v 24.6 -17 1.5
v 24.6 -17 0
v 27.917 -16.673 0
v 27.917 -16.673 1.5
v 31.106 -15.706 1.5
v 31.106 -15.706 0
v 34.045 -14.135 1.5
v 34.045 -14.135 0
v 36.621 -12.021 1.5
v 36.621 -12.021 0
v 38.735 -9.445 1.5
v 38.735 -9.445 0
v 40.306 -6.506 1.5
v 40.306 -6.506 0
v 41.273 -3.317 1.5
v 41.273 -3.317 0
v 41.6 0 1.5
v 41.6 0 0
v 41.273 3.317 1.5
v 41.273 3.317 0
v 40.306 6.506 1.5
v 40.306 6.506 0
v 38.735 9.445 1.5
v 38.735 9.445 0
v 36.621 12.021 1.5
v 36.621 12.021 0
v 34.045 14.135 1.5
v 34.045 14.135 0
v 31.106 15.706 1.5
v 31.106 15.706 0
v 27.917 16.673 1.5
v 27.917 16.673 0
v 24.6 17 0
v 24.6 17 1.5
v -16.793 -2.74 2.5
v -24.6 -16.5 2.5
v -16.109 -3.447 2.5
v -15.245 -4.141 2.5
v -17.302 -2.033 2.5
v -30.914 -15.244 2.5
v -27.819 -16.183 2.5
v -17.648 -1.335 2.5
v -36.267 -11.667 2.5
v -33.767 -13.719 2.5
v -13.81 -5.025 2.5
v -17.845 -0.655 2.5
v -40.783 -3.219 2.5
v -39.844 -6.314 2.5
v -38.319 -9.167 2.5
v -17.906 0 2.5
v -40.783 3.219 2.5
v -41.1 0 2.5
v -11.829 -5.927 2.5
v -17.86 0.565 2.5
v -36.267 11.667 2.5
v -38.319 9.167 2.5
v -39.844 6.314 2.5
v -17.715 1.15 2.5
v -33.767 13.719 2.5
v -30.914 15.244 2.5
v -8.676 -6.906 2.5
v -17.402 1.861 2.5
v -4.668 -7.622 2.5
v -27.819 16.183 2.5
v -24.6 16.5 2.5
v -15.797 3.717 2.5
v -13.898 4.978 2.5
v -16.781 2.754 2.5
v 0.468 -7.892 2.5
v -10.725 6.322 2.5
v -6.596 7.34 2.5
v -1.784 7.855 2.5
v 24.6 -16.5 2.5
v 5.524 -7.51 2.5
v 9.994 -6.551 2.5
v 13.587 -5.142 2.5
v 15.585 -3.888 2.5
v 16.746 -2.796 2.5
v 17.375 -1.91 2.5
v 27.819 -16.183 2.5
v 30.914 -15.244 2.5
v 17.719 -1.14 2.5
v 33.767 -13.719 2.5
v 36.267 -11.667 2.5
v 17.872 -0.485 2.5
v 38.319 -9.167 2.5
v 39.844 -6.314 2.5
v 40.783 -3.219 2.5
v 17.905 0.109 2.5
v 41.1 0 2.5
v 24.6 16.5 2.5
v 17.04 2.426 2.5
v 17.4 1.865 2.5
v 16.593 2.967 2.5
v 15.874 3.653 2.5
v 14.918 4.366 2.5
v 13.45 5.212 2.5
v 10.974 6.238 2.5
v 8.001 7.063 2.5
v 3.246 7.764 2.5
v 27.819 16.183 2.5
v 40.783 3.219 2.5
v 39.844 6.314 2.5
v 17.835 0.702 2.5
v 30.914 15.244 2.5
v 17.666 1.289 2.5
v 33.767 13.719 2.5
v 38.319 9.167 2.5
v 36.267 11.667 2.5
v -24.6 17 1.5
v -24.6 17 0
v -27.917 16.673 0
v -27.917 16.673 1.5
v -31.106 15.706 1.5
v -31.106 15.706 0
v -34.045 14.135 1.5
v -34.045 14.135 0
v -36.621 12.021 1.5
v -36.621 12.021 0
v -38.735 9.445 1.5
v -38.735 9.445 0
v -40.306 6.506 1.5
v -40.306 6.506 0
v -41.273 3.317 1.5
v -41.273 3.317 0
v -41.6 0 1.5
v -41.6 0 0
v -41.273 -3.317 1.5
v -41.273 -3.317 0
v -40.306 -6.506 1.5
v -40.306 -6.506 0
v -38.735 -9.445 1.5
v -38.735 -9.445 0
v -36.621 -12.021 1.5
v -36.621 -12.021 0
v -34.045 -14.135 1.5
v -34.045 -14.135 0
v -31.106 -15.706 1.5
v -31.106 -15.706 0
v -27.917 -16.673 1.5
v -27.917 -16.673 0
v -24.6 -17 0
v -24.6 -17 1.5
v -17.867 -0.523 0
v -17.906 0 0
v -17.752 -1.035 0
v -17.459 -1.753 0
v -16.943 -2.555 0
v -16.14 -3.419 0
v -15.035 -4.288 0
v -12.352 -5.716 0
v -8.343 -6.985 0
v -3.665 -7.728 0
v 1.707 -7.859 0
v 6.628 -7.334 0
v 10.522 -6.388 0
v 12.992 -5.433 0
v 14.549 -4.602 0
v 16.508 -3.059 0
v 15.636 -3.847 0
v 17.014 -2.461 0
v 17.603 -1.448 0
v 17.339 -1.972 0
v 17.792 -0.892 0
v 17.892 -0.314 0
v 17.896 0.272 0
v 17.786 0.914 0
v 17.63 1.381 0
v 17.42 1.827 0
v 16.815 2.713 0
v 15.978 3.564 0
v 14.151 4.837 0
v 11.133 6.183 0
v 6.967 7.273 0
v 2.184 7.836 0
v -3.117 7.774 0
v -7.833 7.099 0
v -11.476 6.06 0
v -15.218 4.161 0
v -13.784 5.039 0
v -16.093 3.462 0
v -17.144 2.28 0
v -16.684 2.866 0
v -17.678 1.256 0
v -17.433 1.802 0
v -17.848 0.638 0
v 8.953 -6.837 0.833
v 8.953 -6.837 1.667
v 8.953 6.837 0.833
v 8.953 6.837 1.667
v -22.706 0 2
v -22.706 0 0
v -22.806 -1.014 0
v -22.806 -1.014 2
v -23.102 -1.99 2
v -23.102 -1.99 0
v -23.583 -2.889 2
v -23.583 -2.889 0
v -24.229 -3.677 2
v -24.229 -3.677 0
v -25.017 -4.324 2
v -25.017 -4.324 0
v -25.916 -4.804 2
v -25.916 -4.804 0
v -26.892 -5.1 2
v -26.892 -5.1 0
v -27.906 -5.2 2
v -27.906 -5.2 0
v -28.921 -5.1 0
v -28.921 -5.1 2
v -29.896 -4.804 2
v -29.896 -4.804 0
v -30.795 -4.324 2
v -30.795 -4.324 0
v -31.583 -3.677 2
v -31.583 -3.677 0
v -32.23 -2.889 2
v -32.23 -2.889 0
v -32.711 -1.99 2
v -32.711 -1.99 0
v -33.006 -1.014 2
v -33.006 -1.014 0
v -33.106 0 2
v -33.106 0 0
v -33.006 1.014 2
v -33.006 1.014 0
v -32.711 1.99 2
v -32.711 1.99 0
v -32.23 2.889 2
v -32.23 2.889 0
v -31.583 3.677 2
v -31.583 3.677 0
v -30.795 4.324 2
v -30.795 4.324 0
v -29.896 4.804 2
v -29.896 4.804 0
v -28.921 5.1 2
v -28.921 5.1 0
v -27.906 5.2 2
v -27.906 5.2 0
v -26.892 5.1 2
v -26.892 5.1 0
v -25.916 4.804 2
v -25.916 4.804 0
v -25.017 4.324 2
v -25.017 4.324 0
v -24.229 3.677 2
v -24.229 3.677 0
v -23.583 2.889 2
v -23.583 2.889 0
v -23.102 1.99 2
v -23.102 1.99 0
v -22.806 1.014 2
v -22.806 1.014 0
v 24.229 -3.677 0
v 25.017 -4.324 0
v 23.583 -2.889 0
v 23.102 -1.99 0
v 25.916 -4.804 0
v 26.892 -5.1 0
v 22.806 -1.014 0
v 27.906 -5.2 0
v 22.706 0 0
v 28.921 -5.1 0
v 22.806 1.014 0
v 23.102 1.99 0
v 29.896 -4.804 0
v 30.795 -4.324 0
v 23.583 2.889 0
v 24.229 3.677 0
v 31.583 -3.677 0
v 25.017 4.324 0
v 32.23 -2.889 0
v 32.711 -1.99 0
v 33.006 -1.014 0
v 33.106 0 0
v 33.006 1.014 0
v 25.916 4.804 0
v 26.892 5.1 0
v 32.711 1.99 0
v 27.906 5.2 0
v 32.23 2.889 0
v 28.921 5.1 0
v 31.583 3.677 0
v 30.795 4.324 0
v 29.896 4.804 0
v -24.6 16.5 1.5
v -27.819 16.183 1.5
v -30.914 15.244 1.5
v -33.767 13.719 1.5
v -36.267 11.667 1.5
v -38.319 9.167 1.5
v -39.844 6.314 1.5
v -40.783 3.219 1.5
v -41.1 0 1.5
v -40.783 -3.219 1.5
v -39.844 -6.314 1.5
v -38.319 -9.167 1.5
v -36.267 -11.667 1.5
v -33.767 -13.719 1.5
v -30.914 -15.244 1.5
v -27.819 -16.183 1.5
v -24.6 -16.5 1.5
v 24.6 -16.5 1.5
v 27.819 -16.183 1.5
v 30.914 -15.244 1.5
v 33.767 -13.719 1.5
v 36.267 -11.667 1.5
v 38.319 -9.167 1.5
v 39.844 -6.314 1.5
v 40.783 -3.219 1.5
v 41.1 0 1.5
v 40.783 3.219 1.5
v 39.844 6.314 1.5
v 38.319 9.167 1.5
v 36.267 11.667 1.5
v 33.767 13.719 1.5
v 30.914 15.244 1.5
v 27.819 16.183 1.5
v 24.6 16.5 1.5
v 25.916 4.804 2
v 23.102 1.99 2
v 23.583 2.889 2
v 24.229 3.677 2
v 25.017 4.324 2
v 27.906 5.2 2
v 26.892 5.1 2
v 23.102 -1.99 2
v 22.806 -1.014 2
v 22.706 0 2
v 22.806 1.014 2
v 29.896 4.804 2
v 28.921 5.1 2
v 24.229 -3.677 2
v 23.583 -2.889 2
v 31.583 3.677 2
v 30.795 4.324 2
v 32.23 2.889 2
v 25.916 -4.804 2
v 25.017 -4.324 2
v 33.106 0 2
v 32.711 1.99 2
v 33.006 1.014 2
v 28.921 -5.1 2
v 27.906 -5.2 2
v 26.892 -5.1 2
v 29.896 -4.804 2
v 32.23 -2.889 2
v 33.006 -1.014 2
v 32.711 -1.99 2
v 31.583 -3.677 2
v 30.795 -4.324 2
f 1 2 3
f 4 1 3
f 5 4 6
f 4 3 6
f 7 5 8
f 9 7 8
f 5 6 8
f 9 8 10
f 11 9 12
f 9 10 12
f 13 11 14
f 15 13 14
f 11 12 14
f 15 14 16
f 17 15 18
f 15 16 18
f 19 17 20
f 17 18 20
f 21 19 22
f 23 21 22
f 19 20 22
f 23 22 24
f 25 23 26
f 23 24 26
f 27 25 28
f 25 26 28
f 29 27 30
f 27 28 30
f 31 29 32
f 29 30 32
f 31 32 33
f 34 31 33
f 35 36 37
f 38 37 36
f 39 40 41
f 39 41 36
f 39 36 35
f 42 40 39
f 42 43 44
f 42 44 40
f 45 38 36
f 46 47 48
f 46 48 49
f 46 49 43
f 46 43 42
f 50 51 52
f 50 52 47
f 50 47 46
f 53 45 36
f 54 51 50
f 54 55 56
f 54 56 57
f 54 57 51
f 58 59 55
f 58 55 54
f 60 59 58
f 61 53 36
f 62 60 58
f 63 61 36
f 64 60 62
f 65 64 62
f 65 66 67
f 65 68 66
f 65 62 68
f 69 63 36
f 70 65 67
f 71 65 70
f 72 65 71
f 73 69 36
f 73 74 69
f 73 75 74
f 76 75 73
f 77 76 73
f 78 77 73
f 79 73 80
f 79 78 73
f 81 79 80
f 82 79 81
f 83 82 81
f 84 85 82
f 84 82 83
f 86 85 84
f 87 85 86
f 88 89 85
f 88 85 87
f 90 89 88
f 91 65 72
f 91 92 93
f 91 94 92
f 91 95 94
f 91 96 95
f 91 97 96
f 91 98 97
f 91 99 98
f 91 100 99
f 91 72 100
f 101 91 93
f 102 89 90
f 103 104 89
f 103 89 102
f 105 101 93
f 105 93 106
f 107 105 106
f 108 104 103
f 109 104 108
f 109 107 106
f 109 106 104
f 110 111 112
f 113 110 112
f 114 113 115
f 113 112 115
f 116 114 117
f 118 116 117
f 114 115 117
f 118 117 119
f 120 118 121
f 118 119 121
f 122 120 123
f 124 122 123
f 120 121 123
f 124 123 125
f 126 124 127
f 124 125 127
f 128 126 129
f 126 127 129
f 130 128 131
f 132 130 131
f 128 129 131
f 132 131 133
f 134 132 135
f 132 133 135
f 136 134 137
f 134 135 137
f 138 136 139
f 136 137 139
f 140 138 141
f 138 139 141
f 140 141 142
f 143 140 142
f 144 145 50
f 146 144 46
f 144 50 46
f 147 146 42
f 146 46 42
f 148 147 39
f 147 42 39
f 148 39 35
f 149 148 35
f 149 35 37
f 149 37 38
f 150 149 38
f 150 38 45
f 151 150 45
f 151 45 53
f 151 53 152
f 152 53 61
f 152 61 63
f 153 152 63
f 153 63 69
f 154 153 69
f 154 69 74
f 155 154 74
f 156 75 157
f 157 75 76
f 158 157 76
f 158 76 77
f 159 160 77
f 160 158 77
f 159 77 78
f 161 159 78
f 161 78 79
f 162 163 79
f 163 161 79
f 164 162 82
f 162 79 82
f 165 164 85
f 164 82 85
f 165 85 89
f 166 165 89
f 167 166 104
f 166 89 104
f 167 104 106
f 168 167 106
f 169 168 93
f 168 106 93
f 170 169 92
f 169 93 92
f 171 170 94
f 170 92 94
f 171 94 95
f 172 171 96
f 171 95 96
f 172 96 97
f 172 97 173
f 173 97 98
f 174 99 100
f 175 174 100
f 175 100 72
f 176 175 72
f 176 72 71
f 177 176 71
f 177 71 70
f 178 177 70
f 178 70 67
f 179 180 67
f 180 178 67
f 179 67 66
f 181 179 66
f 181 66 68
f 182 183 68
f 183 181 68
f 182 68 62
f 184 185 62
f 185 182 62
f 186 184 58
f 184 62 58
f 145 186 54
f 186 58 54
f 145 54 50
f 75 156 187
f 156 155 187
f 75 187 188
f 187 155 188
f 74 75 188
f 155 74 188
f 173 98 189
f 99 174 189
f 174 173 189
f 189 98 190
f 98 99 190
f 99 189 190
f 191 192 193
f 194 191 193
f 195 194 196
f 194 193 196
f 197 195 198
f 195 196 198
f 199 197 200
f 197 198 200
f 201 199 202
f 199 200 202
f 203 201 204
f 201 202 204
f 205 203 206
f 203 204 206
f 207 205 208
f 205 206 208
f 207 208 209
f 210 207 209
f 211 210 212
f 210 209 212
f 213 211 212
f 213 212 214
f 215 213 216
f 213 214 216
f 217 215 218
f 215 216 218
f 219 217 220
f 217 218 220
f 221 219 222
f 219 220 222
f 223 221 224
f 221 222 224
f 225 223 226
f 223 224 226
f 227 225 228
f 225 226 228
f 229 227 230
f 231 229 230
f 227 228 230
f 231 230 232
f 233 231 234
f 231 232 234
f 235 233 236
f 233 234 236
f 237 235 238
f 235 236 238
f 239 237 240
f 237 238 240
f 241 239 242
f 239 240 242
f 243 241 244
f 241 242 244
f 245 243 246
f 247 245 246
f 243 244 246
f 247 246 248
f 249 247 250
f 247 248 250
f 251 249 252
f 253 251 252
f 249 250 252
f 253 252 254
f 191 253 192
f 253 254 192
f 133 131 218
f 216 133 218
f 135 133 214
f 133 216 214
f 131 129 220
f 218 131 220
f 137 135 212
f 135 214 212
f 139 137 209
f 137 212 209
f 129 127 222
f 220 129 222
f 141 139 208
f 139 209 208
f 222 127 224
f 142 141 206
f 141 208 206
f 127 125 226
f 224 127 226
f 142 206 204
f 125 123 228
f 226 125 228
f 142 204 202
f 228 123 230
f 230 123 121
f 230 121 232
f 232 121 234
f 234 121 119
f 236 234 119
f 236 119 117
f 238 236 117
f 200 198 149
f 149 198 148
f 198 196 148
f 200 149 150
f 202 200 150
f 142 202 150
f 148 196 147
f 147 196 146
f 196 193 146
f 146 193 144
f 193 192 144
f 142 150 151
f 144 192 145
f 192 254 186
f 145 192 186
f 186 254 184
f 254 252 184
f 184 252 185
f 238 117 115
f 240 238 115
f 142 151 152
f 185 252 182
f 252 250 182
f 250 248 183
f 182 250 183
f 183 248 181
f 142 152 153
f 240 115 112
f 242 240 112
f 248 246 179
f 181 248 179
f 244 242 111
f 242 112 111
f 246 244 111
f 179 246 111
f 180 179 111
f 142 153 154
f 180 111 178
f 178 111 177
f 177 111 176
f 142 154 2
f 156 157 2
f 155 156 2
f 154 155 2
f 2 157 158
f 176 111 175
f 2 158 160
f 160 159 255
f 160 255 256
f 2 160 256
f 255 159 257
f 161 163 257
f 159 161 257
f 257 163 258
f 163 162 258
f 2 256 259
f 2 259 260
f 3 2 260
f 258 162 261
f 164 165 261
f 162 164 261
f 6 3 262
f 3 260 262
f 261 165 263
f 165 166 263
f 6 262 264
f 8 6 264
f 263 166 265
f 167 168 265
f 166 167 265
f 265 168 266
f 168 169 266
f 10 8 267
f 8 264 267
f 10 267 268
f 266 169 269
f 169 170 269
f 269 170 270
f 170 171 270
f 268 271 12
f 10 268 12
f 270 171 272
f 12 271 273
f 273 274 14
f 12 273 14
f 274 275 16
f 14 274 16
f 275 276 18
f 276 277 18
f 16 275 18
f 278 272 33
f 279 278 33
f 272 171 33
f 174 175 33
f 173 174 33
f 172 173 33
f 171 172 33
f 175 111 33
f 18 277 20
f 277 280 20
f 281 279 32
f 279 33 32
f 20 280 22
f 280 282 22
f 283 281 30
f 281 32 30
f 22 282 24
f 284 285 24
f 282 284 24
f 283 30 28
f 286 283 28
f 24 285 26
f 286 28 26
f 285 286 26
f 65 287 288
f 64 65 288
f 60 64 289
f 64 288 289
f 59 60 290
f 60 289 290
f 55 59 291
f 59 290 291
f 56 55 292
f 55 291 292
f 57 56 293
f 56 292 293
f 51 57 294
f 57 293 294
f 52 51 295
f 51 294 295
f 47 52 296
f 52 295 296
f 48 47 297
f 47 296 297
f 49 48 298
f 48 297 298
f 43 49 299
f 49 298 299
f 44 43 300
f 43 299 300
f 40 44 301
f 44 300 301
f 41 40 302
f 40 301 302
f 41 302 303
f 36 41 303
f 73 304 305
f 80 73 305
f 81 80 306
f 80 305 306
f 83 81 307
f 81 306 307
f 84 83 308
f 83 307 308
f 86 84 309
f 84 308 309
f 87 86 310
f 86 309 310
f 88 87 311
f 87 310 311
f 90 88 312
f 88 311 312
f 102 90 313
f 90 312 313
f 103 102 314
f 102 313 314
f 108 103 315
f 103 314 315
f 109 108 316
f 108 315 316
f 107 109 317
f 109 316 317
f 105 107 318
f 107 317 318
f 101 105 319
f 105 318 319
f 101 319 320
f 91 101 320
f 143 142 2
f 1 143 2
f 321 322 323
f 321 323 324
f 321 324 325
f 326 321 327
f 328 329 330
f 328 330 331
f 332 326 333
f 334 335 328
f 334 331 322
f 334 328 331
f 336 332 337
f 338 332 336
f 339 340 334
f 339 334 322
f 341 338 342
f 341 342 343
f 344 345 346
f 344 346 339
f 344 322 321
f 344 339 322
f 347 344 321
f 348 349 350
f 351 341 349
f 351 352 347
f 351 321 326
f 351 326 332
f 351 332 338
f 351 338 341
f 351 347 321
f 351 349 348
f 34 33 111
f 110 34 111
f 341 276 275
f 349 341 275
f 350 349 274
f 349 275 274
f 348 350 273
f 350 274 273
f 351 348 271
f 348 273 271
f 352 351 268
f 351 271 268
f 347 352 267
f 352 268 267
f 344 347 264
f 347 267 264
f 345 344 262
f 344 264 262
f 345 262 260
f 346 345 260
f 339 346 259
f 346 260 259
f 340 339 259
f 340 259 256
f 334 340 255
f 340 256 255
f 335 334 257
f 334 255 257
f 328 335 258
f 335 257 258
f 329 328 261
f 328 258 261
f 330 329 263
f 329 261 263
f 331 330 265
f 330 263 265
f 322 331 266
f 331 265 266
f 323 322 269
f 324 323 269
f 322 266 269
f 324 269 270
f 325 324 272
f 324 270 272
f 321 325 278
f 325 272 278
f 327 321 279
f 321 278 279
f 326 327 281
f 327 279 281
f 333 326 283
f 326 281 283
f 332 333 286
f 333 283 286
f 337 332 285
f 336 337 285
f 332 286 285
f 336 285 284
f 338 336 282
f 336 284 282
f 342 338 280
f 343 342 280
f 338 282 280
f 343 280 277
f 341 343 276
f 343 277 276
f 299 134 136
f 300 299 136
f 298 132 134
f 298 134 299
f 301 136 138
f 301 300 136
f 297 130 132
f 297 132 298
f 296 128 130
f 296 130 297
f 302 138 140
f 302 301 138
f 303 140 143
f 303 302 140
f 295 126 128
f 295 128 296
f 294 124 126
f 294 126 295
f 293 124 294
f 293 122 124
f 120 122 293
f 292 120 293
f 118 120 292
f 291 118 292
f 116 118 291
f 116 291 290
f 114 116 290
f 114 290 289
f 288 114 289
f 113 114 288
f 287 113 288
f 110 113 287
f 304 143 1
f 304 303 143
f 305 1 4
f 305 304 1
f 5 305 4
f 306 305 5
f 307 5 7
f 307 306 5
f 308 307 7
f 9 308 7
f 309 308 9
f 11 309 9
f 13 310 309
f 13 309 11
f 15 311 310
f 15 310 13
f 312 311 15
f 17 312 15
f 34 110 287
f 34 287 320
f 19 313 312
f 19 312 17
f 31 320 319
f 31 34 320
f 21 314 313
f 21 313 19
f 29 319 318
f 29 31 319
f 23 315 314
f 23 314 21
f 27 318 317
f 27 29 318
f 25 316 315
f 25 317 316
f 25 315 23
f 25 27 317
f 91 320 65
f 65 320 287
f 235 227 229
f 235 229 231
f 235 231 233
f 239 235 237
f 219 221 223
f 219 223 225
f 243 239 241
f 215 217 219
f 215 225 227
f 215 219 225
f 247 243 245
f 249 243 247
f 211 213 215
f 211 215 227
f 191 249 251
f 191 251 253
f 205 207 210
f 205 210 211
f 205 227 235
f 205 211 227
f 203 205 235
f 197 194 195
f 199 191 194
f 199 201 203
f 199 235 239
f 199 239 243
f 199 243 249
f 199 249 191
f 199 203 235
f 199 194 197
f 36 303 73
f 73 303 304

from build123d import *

# Parameters (mm, degrees)
F1_DEPTH = 1.5
F3_DEPTH = 1
F5_DEPTH = 25
F6_R     = 5.2
F7_DEPTH = 2


with BuildPart() as f1:
    # F0 (on Top) → F1 (new body)
    with BuildSketch(Plane.XY):
        with BuildLine():
            Line((24.6, 17), (-24.6, 17))
            ThreePointArc((-24.6, 17), (-41.6, 0), (-24.6, -17))
            Line((-24.6, -17), (24.6, -17))
            ThreePointArc((24.6, -17), (41.6, 0), (24.6, 17))
        make_face()
    extrude(amount=F1_DEPTH)

    # F2 (on face) → F3 (join)
    with BuildSketch(Plane.XY.offset(1.5)):
        with BuildLine():
            Line((24.6, 16.5), (-24.6, 16.5))
            ThreePointArc((-24.6, 16.5), (-41.1, 0), (-24.6, -16.5))
            Line((-24.6, -16.5), (24.6, -16.5))
            ThreePointArc((24.6, -16.5), (41.1, 0), (24.6, 16.5))
        make_face()
    extrude(amount=F3_DEPTH)

    # F4 (on face) → F5 (cut)
    with BuildSketch(Plane.XY.offset(2.5)):
        with BuildLine():
            add(Edge.make_bspline(
                [(-17.906335, 0), (-17.906335, -13.673996), (8.953167, -6.836998), (35.81267, 0), (8.953168, 6.836998), (-17.906335, 13.673996), (-17.906335, 0)],
                knots=[0, 0, 0, 2.094395, 2.094395, 4.18879, 4.18879, 6.283185, 6.283185, 6.283185], degree=2, weights=[1, 0.5, 1, 0.5, 1, 0.5, 1]))
        make_face()
    extrude(amount=-F5_DEPTH, mode=Mode.SUBTRACT)

    # F6 (on face) → F7 (cut)
    with BuildSketch(Plane(origin=(0, 0, 0), x_dir=(1, 0, 0), z_dir=(0, 0, -1))):
        with Locations((-27.906335, 0)):
            Circle(F6_R)
        with Locations((27.906335, 0)):
            Circle(F6_R)
    extrude(amount=-F7_DEPTH, mode=Mode.SUBTRACT)


solid = f1.part
